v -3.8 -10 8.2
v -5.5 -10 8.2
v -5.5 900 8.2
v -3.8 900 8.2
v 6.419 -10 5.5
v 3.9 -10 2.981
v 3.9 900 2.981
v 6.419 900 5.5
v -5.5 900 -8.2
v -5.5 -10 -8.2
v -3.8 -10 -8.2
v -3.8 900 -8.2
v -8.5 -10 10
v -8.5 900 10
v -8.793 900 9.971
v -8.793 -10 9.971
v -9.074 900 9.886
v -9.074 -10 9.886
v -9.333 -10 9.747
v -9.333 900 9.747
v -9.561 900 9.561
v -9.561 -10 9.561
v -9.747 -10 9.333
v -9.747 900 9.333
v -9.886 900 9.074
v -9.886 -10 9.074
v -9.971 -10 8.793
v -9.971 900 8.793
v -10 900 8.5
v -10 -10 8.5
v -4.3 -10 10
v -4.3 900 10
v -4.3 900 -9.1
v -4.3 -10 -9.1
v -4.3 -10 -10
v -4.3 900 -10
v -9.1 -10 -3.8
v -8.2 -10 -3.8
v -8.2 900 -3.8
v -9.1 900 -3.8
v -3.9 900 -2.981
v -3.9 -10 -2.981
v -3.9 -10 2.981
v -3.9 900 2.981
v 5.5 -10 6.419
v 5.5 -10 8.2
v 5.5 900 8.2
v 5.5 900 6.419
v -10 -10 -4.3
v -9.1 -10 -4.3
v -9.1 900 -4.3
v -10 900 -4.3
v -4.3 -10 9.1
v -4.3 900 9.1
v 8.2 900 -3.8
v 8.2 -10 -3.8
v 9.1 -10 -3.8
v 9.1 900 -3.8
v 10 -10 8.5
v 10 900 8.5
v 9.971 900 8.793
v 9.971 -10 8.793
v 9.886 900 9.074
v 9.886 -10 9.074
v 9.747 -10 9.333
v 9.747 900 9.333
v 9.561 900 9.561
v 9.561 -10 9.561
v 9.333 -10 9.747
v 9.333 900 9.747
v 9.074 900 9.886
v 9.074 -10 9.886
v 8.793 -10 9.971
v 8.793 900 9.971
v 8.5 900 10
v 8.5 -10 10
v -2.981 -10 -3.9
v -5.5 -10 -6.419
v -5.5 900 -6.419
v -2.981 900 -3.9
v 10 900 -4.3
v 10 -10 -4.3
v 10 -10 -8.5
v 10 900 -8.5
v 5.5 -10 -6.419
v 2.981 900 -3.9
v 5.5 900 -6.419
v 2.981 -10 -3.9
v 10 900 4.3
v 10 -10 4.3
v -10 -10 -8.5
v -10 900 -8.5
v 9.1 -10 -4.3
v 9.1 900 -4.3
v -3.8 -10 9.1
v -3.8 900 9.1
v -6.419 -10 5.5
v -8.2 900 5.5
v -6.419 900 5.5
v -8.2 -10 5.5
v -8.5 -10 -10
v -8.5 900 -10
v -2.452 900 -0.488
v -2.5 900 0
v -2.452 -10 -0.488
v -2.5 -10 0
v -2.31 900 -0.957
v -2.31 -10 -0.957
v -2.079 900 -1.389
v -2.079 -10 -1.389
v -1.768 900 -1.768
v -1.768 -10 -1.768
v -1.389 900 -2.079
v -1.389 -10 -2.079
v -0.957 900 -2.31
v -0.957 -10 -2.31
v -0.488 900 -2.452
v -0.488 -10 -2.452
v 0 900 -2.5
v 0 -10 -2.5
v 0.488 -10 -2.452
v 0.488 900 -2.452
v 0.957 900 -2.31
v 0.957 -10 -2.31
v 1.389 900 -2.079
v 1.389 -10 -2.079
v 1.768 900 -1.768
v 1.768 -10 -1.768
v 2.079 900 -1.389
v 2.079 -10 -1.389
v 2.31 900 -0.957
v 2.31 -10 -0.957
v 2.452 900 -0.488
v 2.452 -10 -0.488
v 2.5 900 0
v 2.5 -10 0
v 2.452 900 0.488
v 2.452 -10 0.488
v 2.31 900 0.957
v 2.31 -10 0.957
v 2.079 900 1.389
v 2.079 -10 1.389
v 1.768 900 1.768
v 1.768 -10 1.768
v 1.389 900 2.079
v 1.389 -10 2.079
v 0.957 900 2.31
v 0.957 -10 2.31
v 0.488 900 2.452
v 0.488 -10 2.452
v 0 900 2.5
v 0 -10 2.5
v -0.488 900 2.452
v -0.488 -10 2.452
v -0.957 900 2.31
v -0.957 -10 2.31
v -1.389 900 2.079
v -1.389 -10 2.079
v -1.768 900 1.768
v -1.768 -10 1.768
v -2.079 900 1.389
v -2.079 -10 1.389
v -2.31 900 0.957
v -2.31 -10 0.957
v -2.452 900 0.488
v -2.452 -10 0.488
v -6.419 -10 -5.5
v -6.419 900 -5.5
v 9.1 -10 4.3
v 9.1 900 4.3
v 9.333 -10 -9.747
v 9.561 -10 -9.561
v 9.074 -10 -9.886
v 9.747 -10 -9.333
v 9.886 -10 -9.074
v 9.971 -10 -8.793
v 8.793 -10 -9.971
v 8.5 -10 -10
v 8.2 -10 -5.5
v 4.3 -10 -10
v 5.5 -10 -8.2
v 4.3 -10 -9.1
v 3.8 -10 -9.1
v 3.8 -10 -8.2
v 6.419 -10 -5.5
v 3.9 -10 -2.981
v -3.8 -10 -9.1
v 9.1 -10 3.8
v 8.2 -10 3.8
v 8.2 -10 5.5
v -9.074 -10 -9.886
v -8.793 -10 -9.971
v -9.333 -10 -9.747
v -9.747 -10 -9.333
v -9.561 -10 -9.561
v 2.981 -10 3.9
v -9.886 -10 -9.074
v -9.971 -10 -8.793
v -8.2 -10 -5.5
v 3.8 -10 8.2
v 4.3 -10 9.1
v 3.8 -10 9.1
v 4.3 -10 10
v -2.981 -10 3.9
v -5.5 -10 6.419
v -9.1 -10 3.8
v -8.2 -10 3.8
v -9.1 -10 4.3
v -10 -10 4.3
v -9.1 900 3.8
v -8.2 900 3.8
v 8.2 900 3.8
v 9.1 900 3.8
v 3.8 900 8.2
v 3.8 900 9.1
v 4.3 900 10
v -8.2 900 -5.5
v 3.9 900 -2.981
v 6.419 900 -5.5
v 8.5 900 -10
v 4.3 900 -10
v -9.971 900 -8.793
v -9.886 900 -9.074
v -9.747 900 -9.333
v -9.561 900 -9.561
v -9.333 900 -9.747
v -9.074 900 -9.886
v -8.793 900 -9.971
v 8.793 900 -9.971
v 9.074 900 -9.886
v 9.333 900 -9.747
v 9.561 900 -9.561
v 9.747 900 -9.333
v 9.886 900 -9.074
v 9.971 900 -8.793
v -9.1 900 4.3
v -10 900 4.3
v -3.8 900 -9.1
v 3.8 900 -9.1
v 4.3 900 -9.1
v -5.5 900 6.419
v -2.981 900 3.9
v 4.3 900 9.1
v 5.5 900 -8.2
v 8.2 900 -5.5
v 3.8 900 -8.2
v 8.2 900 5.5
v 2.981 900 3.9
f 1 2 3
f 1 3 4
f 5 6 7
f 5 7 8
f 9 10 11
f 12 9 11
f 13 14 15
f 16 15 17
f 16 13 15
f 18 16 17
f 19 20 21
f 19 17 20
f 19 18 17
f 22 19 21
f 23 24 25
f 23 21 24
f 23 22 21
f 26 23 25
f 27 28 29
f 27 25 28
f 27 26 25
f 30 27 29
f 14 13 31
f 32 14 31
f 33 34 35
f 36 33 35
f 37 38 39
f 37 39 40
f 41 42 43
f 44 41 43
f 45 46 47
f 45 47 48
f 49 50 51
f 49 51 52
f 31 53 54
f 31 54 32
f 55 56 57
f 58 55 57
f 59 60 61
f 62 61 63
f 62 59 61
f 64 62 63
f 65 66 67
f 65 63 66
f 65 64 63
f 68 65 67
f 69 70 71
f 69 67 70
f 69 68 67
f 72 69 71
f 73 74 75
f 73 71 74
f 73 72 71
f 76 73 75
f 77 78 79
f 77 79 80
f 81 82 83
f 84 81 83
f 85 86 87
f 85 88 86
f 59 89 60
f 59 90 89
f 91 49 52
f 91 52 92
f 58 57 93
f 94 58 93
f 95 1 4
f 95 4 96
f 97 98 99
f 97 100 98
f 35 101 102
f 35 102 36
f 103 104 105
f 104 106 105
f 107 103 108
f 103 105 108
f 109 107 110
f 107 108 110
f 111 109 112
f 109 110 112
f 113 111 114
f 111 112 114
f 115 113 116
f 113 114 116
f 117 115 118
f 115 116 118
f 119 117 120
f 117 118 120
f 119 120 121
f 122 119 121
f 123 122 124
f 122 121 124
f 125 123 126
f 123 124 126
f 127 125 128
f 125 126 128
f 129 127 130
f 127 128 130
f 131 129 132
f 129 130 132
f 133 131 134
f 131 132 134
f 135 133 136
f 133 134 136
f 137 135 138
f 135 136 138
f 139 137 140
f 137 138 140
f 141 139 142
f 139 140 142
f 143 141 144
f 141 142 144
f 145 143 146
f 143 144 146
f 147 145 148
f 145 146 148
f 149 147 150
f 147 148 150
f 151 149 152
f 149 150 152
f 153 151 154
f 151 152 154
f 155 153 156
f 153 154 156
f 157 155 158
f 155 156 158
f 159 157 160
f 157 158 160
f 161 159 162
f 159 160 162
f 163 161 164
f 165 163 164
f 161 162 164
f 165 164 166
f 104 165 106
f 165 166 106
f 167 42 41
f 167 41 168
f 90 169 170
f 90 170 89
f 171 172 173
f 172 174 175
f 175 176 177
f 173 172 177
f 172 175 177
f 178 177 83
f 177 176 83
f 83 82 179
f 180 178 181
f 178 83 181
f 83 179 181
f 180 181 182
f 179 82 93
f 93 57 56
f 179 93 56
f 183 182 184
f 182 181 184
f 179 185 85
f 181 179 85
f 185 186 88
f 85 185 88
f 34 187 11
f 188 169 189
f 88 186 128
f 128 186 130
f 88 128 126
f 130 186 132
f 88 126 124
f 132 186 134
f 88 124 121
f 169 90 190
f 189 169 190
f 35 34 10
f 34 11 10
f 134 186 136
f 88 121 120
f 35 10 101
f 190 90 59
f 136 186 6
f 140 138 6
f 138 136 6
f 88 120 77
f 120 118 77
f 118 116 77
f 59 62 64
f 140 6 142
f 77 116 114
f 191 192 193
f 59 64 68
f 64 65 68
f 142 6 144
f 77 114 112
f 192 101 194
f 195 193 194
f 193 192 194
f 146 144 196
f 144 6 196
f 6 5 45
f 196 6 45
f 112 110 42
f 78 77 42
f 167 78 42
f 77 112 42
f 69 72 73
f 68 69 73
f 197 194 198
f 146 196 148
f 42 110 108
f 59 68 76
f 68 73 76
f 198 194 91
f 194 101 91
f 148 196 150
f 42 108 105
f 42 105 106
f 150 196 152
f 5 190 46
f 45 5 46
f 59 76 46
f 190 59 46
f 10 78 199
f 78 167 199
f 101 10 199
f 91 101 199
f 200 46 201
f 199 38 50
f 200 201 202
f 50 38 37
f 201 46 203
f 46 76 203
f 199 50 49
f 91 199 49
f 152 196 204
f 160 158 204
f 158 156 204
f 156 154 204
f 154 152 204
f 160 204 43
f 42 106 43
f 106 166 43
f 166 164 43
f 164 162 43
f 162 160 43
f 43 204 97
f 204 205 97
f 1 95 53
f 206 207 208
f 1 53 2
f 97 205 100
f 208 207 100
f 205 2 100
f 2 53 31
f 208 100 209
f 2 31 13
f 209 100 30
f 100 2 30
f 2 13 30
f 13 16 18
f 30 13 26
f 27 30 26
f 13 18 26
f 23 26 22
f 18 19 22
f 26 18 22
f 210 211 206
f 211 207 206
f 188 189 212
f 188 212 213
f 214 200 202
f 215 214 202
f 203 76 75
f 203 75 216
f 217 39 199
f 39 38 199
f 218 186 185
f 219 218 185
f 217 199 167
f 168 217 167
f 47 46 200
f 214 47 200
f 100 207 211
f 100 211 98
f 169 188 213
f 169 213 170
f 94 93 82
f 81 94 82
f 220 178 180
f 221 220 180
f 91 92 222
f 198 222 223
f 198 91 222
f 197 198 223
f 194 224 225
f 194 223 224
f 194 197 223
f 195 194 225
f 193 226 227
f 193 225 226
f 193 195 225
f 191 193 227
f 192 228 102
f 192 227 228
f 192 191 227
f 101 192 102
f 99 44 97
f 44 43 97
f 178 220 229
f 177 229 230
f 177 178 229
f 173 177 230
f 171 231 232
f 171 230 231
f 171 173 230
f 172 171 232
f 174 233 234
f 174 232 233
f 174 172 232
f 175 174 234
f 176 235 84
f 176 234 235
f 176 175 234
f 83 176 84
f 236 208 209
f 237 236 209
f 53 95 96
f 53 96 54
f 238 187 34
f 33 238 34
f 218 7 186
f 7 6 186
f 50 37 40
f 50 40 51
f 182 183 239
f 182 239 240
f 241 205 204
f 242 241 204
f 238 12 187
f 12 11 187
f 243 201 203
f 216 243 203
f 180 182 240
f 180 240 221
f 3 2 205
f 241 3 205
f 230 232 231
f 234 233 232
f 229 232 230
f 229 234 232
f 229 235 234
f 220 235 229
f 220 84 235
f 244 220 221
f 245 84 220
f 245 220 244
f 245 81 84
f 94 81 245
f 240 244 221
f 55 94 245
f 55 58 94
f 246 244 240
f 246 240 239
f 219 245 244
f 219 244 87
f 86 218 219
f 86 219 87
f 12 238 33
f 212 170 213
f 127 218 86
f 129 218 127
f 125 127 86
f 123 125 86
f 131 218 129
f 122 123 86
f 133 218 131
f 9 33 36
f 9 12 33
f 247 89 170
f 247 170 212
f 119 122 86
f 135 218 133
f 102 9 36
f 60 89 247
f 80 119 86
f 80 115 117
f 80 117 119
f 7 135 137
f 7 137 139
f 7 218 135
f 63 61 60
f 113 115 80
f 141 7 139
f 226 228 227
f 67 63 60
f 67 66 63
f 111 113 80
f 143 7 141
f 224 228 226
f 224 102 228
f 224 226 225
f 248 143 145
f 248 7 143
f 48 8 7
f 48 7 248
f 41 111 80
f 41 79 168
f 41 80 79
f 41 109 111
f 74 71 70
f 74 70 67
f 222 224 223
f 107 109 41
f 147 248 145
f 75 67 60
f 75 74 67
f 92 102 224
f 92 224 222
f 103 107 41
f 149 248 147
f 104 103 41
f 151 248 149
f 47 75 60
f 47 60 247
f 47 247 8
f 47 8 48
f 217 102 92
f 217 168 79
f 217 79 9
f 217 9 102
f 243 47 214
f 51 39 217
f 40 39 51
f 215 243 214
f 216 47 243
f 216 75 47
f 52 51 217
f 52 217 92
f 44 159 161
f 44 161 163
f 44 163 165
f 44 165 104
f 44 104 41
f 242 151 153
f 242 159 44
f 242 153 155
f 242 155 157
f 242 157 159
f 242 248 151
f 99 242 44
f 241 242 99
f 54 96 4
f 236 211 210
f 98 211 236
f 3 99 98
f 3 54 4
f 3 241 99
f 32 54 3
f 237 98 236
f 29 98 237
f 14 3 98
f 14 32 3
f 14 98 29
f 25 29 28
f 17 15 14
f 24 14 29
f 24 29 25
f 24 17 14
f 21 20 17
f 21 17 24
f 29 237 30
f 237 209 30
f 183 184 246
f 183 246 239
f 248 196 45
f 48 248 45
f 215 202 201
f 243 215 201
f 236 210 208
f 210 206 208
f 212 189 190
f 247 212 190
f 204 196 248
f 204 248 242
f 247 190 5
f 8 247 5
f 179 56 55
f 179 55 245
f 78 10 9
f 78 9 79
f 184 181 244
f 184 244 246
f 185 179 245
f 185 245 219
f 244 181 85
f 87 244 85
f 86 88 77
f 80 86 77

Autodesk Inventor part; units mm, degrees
ref_plane "起始平面" through (0, -10, 0) normal (0, 1, 0) x (-1, 0, 0)
ref_plane "终止平面" through (0, 900, 0) normal (0, 1, 0) x (-1, 0, 0)
sketch "草图" plane through (0, 0, 0) normal (0, 1, 0) x (-1, 0, 0)
  line L0 (-9.1, 10.0192) -> (-9.101, 10.0203)
  line L1 (-10, 10) -> (-9.5607, 9.5607) construction
  arc A0 (-8.5, 10) -> (-10, 8.5) centre (-8.5, 8.5) ccw
  circle A1 centre (0, 0) radius 2.5
  line L2 (-2.9808, 3.9) -> (0, 3.9)
  line L3 (-3.9, 0) -> (-3.9, 2.9808)
  line L4 (-2.5, 0) -> (-3.1, 0)
  line L5 (2.9808, 3.9) -> (0, 3.9)
  circle A2 centre (0, 0) radius 2.5
  circle A3 centre (0, 0) radius 2.5
  circle A4 centre (0, 0) radius 2.5
  line L6 (0, 16.3557) -> (0, -12.0006)
  line L7 (-4.3, 9.1) -> (-4.3, 10)
  line L8 (2.9808, -3.9) -> (0, -3.9)
  line L9 (-3.9, 0) -> (-3.9, -2.9808)
  line L10 (3.9, 0) -> (3.9, -2.9808)
  line L11 (-2.9808, -3.9) -> (-5.5, -6.4192)
  line L12 (-2.9808, -3.9) -> (0, -3.9)
  line L13 (3.8, -8.2) -> (3.8, -9.1)
  line L14 (5.5, -6.4192) -> (2.9808, -3.9)
  line L15 (3.8, -9.1) -> (4.3, -9.1)
  line L16 (5.5, -8.2) -> (3.8, -8.2)
  line L17 (5.5, -8.2) -> (5.5, -6.4192)
  line L18 (3.9, -2.9808) -> (6.4192, -5.5)
  line L19 (8.2, -3.8) -> (8.2, -5.5)
  line L20 (8.2, -5.5) -> (6.4192, -5.5)
  line L21 (8.2, -3.8) -> (9.1, -3.8)
  line L22 (9.1, -3.8) -> (9.1, -4.3)
  line L23 (9.1, -4.3) -> (10, -4.3)
  line L24 (10, -4.3) -> (10, -8.5)
  arc A5 (8.5, -10) -> (10, -8.5) centre (8.5, -8.5) ccw
  line L25 (8.5, -10) -> (4.3, -10)
  line L26 (4.3, -9.1) -> (4.3, -10)
  line L27 (5.5, 6.4192) -> (2.9808, 3.9)
  line L28 (3.9, 2.9808) -> (6.4192, 5.5)
  line L29 (10, 4.3) -> (10, 8.5)
  line L30 (3.9, 0) -> (3.9, 2.9808)
  line L31 (5.5, 8.2) -> (5.5, 6.4192)
  line L32 (5.5, 8.2) -> (3.8, 8.2)
  line L33 (4.3, 9.1) -> (4.3, 10)
  arc A6 (10, 8.5) -> (8.5, 10) centre (8.5, 8.5) ccw
  line L34 (8.5, 10) -> (4.3, 10)
  line L35 (8.2, 3.8) -> (9.1, 3.8)
  line L36 (9.1, 4.3) -> (10, 4.3)
  line L37 (9.1, 3.8) -> (9.1, 4.3)
  line L38 (8.2, 3.8) -> (8.2, 5.5)
  line L39 (8.2, 5.5) -> (6.4192, 5.5)
  line L40 (3.8, 8.2) -> (3.8, 9.1)
  line L41 (3.8, 9.1) -> (4.3, 9.1)
  line L42 (-10, 4.3) -> (-10, 8.5)
  line L43 (-8.5, 10) -> (-4.3, 10)
  line L44 (-9.1, 4.3) -> (-10, 4.3)
  line L45 (-9.1, 3.8) -> (-9.1, 4.3)
  line L46 (-8.2, 3.8) -> (-9.1, 3.8)
  line L47 (-8.2, 5.5) -> (-6.4192, 5.5)
  line L48 (-8.2, 3.8) -> (-8.2, 5.5)
  line L49 (-5.5, 8.2) -> (-5.5, 6.4192)
  line L50 (-3.8, 9.1) -> (-4.3, 9.1)
  line L51 (-3.8, 8.2) -> (-3.8, 9.1)
  line L52 (-5.5, 8.2) -> (-3.8, 8.2)
  line L53 (-3.9, 2.9808) -> (-6.4192, 5.5)
  line L54 (-2.9808, 3.9) -> (-5.5, 6.4192)
  line L55 (-5.5, -8.2) -> (-3.8, -8.2)
  line L56 (-5.5, -8.2) -> (-5.5, -6.4192)
  line L57 (-3.9, -2.9808) -> (-6.4192, -5.5)
  line L58 (-3.8, -8.2) -> (-3.8, -9.1)
  line L59 (-3.8, -9.1) -> (-4.3, -9.1)
  line L60 (-4.3, -9.1) -> (-4.3, -10)
  line L61 (-8.2, -5.5) -> (-6.4192, -5.5)
  line L62 (-8.2, -3.8) -> (-9.1, -3.8)
  line L63 (-9.1, -3.8) -> (-9.1, -4.3)
  line L64 (-8.5, -10) -> (-4.3, -10)
  line L65 (-9.1, -4.3) -> (-10, -4.3)
  line L66 (-10, -4.3) -> (-10, -8.5)
  arc A7 (-10, -8.5) -> (-8.5, -10) centre (-8.5, -8.5) ccw
  line L67 (-8.2, -3.8) -> (-8.2, -5.5)
  dimension "圆角" = 1.5
  dimension "宽度" = 20
extrude "实体" add sketch "草图" along normal up to surface (910 mm away) from surface at -10 contours L43 L7 L50 L51 L52 L49 L54 L2 L6 A1 L12 L11 L56 L55 L58 L59 L60 L64 A7 L66 L65 L63 L62 L67 L61 L57 L9 L3 L53 L47 L48 L46 L45 L44 L42 A0 | L5 L27 L31 L32 L40 L41 L33 L34 A6 L29 L36 L37 L35 L38 L39 L28 L30 L10 L18 L20 L19 L21 L22 L23 L24 A5 L25 L26 L15 L13 L16 L17 L14 L8 L6 A1
sketch "草图2" plane through (0, 0, 0) normal (0, 1, 0) x (-1, 0, 0)
  line L0 (0, 0) -> (10, 0)
ref_plane "工作平面3" through (0, 0, 0) normal (0, 0, -1) x (-1, 0, 0)
sketch "草图3" plane through (0, 0, 0) normal (0, 0, -1) x (-1, 0, 0)
  line L0 (-2, -10) -> (12, -10)
  line L1 (-2, 900) -> (12, 900)
  dimension "d11" = 910
ref_plane "工作平面4" through (-4.3, -10, 800) normal (0, -1, 0) x (1, 0, 0)
split "分割1" plane through (-4.3, -10, 800) removes the side toward (0, -1, 0)
equation "\"G_OFFSET_END\" = 0"
equation "\"G_L\" = d11"
properties part number "欧标 2020铝合金钢材-01"
